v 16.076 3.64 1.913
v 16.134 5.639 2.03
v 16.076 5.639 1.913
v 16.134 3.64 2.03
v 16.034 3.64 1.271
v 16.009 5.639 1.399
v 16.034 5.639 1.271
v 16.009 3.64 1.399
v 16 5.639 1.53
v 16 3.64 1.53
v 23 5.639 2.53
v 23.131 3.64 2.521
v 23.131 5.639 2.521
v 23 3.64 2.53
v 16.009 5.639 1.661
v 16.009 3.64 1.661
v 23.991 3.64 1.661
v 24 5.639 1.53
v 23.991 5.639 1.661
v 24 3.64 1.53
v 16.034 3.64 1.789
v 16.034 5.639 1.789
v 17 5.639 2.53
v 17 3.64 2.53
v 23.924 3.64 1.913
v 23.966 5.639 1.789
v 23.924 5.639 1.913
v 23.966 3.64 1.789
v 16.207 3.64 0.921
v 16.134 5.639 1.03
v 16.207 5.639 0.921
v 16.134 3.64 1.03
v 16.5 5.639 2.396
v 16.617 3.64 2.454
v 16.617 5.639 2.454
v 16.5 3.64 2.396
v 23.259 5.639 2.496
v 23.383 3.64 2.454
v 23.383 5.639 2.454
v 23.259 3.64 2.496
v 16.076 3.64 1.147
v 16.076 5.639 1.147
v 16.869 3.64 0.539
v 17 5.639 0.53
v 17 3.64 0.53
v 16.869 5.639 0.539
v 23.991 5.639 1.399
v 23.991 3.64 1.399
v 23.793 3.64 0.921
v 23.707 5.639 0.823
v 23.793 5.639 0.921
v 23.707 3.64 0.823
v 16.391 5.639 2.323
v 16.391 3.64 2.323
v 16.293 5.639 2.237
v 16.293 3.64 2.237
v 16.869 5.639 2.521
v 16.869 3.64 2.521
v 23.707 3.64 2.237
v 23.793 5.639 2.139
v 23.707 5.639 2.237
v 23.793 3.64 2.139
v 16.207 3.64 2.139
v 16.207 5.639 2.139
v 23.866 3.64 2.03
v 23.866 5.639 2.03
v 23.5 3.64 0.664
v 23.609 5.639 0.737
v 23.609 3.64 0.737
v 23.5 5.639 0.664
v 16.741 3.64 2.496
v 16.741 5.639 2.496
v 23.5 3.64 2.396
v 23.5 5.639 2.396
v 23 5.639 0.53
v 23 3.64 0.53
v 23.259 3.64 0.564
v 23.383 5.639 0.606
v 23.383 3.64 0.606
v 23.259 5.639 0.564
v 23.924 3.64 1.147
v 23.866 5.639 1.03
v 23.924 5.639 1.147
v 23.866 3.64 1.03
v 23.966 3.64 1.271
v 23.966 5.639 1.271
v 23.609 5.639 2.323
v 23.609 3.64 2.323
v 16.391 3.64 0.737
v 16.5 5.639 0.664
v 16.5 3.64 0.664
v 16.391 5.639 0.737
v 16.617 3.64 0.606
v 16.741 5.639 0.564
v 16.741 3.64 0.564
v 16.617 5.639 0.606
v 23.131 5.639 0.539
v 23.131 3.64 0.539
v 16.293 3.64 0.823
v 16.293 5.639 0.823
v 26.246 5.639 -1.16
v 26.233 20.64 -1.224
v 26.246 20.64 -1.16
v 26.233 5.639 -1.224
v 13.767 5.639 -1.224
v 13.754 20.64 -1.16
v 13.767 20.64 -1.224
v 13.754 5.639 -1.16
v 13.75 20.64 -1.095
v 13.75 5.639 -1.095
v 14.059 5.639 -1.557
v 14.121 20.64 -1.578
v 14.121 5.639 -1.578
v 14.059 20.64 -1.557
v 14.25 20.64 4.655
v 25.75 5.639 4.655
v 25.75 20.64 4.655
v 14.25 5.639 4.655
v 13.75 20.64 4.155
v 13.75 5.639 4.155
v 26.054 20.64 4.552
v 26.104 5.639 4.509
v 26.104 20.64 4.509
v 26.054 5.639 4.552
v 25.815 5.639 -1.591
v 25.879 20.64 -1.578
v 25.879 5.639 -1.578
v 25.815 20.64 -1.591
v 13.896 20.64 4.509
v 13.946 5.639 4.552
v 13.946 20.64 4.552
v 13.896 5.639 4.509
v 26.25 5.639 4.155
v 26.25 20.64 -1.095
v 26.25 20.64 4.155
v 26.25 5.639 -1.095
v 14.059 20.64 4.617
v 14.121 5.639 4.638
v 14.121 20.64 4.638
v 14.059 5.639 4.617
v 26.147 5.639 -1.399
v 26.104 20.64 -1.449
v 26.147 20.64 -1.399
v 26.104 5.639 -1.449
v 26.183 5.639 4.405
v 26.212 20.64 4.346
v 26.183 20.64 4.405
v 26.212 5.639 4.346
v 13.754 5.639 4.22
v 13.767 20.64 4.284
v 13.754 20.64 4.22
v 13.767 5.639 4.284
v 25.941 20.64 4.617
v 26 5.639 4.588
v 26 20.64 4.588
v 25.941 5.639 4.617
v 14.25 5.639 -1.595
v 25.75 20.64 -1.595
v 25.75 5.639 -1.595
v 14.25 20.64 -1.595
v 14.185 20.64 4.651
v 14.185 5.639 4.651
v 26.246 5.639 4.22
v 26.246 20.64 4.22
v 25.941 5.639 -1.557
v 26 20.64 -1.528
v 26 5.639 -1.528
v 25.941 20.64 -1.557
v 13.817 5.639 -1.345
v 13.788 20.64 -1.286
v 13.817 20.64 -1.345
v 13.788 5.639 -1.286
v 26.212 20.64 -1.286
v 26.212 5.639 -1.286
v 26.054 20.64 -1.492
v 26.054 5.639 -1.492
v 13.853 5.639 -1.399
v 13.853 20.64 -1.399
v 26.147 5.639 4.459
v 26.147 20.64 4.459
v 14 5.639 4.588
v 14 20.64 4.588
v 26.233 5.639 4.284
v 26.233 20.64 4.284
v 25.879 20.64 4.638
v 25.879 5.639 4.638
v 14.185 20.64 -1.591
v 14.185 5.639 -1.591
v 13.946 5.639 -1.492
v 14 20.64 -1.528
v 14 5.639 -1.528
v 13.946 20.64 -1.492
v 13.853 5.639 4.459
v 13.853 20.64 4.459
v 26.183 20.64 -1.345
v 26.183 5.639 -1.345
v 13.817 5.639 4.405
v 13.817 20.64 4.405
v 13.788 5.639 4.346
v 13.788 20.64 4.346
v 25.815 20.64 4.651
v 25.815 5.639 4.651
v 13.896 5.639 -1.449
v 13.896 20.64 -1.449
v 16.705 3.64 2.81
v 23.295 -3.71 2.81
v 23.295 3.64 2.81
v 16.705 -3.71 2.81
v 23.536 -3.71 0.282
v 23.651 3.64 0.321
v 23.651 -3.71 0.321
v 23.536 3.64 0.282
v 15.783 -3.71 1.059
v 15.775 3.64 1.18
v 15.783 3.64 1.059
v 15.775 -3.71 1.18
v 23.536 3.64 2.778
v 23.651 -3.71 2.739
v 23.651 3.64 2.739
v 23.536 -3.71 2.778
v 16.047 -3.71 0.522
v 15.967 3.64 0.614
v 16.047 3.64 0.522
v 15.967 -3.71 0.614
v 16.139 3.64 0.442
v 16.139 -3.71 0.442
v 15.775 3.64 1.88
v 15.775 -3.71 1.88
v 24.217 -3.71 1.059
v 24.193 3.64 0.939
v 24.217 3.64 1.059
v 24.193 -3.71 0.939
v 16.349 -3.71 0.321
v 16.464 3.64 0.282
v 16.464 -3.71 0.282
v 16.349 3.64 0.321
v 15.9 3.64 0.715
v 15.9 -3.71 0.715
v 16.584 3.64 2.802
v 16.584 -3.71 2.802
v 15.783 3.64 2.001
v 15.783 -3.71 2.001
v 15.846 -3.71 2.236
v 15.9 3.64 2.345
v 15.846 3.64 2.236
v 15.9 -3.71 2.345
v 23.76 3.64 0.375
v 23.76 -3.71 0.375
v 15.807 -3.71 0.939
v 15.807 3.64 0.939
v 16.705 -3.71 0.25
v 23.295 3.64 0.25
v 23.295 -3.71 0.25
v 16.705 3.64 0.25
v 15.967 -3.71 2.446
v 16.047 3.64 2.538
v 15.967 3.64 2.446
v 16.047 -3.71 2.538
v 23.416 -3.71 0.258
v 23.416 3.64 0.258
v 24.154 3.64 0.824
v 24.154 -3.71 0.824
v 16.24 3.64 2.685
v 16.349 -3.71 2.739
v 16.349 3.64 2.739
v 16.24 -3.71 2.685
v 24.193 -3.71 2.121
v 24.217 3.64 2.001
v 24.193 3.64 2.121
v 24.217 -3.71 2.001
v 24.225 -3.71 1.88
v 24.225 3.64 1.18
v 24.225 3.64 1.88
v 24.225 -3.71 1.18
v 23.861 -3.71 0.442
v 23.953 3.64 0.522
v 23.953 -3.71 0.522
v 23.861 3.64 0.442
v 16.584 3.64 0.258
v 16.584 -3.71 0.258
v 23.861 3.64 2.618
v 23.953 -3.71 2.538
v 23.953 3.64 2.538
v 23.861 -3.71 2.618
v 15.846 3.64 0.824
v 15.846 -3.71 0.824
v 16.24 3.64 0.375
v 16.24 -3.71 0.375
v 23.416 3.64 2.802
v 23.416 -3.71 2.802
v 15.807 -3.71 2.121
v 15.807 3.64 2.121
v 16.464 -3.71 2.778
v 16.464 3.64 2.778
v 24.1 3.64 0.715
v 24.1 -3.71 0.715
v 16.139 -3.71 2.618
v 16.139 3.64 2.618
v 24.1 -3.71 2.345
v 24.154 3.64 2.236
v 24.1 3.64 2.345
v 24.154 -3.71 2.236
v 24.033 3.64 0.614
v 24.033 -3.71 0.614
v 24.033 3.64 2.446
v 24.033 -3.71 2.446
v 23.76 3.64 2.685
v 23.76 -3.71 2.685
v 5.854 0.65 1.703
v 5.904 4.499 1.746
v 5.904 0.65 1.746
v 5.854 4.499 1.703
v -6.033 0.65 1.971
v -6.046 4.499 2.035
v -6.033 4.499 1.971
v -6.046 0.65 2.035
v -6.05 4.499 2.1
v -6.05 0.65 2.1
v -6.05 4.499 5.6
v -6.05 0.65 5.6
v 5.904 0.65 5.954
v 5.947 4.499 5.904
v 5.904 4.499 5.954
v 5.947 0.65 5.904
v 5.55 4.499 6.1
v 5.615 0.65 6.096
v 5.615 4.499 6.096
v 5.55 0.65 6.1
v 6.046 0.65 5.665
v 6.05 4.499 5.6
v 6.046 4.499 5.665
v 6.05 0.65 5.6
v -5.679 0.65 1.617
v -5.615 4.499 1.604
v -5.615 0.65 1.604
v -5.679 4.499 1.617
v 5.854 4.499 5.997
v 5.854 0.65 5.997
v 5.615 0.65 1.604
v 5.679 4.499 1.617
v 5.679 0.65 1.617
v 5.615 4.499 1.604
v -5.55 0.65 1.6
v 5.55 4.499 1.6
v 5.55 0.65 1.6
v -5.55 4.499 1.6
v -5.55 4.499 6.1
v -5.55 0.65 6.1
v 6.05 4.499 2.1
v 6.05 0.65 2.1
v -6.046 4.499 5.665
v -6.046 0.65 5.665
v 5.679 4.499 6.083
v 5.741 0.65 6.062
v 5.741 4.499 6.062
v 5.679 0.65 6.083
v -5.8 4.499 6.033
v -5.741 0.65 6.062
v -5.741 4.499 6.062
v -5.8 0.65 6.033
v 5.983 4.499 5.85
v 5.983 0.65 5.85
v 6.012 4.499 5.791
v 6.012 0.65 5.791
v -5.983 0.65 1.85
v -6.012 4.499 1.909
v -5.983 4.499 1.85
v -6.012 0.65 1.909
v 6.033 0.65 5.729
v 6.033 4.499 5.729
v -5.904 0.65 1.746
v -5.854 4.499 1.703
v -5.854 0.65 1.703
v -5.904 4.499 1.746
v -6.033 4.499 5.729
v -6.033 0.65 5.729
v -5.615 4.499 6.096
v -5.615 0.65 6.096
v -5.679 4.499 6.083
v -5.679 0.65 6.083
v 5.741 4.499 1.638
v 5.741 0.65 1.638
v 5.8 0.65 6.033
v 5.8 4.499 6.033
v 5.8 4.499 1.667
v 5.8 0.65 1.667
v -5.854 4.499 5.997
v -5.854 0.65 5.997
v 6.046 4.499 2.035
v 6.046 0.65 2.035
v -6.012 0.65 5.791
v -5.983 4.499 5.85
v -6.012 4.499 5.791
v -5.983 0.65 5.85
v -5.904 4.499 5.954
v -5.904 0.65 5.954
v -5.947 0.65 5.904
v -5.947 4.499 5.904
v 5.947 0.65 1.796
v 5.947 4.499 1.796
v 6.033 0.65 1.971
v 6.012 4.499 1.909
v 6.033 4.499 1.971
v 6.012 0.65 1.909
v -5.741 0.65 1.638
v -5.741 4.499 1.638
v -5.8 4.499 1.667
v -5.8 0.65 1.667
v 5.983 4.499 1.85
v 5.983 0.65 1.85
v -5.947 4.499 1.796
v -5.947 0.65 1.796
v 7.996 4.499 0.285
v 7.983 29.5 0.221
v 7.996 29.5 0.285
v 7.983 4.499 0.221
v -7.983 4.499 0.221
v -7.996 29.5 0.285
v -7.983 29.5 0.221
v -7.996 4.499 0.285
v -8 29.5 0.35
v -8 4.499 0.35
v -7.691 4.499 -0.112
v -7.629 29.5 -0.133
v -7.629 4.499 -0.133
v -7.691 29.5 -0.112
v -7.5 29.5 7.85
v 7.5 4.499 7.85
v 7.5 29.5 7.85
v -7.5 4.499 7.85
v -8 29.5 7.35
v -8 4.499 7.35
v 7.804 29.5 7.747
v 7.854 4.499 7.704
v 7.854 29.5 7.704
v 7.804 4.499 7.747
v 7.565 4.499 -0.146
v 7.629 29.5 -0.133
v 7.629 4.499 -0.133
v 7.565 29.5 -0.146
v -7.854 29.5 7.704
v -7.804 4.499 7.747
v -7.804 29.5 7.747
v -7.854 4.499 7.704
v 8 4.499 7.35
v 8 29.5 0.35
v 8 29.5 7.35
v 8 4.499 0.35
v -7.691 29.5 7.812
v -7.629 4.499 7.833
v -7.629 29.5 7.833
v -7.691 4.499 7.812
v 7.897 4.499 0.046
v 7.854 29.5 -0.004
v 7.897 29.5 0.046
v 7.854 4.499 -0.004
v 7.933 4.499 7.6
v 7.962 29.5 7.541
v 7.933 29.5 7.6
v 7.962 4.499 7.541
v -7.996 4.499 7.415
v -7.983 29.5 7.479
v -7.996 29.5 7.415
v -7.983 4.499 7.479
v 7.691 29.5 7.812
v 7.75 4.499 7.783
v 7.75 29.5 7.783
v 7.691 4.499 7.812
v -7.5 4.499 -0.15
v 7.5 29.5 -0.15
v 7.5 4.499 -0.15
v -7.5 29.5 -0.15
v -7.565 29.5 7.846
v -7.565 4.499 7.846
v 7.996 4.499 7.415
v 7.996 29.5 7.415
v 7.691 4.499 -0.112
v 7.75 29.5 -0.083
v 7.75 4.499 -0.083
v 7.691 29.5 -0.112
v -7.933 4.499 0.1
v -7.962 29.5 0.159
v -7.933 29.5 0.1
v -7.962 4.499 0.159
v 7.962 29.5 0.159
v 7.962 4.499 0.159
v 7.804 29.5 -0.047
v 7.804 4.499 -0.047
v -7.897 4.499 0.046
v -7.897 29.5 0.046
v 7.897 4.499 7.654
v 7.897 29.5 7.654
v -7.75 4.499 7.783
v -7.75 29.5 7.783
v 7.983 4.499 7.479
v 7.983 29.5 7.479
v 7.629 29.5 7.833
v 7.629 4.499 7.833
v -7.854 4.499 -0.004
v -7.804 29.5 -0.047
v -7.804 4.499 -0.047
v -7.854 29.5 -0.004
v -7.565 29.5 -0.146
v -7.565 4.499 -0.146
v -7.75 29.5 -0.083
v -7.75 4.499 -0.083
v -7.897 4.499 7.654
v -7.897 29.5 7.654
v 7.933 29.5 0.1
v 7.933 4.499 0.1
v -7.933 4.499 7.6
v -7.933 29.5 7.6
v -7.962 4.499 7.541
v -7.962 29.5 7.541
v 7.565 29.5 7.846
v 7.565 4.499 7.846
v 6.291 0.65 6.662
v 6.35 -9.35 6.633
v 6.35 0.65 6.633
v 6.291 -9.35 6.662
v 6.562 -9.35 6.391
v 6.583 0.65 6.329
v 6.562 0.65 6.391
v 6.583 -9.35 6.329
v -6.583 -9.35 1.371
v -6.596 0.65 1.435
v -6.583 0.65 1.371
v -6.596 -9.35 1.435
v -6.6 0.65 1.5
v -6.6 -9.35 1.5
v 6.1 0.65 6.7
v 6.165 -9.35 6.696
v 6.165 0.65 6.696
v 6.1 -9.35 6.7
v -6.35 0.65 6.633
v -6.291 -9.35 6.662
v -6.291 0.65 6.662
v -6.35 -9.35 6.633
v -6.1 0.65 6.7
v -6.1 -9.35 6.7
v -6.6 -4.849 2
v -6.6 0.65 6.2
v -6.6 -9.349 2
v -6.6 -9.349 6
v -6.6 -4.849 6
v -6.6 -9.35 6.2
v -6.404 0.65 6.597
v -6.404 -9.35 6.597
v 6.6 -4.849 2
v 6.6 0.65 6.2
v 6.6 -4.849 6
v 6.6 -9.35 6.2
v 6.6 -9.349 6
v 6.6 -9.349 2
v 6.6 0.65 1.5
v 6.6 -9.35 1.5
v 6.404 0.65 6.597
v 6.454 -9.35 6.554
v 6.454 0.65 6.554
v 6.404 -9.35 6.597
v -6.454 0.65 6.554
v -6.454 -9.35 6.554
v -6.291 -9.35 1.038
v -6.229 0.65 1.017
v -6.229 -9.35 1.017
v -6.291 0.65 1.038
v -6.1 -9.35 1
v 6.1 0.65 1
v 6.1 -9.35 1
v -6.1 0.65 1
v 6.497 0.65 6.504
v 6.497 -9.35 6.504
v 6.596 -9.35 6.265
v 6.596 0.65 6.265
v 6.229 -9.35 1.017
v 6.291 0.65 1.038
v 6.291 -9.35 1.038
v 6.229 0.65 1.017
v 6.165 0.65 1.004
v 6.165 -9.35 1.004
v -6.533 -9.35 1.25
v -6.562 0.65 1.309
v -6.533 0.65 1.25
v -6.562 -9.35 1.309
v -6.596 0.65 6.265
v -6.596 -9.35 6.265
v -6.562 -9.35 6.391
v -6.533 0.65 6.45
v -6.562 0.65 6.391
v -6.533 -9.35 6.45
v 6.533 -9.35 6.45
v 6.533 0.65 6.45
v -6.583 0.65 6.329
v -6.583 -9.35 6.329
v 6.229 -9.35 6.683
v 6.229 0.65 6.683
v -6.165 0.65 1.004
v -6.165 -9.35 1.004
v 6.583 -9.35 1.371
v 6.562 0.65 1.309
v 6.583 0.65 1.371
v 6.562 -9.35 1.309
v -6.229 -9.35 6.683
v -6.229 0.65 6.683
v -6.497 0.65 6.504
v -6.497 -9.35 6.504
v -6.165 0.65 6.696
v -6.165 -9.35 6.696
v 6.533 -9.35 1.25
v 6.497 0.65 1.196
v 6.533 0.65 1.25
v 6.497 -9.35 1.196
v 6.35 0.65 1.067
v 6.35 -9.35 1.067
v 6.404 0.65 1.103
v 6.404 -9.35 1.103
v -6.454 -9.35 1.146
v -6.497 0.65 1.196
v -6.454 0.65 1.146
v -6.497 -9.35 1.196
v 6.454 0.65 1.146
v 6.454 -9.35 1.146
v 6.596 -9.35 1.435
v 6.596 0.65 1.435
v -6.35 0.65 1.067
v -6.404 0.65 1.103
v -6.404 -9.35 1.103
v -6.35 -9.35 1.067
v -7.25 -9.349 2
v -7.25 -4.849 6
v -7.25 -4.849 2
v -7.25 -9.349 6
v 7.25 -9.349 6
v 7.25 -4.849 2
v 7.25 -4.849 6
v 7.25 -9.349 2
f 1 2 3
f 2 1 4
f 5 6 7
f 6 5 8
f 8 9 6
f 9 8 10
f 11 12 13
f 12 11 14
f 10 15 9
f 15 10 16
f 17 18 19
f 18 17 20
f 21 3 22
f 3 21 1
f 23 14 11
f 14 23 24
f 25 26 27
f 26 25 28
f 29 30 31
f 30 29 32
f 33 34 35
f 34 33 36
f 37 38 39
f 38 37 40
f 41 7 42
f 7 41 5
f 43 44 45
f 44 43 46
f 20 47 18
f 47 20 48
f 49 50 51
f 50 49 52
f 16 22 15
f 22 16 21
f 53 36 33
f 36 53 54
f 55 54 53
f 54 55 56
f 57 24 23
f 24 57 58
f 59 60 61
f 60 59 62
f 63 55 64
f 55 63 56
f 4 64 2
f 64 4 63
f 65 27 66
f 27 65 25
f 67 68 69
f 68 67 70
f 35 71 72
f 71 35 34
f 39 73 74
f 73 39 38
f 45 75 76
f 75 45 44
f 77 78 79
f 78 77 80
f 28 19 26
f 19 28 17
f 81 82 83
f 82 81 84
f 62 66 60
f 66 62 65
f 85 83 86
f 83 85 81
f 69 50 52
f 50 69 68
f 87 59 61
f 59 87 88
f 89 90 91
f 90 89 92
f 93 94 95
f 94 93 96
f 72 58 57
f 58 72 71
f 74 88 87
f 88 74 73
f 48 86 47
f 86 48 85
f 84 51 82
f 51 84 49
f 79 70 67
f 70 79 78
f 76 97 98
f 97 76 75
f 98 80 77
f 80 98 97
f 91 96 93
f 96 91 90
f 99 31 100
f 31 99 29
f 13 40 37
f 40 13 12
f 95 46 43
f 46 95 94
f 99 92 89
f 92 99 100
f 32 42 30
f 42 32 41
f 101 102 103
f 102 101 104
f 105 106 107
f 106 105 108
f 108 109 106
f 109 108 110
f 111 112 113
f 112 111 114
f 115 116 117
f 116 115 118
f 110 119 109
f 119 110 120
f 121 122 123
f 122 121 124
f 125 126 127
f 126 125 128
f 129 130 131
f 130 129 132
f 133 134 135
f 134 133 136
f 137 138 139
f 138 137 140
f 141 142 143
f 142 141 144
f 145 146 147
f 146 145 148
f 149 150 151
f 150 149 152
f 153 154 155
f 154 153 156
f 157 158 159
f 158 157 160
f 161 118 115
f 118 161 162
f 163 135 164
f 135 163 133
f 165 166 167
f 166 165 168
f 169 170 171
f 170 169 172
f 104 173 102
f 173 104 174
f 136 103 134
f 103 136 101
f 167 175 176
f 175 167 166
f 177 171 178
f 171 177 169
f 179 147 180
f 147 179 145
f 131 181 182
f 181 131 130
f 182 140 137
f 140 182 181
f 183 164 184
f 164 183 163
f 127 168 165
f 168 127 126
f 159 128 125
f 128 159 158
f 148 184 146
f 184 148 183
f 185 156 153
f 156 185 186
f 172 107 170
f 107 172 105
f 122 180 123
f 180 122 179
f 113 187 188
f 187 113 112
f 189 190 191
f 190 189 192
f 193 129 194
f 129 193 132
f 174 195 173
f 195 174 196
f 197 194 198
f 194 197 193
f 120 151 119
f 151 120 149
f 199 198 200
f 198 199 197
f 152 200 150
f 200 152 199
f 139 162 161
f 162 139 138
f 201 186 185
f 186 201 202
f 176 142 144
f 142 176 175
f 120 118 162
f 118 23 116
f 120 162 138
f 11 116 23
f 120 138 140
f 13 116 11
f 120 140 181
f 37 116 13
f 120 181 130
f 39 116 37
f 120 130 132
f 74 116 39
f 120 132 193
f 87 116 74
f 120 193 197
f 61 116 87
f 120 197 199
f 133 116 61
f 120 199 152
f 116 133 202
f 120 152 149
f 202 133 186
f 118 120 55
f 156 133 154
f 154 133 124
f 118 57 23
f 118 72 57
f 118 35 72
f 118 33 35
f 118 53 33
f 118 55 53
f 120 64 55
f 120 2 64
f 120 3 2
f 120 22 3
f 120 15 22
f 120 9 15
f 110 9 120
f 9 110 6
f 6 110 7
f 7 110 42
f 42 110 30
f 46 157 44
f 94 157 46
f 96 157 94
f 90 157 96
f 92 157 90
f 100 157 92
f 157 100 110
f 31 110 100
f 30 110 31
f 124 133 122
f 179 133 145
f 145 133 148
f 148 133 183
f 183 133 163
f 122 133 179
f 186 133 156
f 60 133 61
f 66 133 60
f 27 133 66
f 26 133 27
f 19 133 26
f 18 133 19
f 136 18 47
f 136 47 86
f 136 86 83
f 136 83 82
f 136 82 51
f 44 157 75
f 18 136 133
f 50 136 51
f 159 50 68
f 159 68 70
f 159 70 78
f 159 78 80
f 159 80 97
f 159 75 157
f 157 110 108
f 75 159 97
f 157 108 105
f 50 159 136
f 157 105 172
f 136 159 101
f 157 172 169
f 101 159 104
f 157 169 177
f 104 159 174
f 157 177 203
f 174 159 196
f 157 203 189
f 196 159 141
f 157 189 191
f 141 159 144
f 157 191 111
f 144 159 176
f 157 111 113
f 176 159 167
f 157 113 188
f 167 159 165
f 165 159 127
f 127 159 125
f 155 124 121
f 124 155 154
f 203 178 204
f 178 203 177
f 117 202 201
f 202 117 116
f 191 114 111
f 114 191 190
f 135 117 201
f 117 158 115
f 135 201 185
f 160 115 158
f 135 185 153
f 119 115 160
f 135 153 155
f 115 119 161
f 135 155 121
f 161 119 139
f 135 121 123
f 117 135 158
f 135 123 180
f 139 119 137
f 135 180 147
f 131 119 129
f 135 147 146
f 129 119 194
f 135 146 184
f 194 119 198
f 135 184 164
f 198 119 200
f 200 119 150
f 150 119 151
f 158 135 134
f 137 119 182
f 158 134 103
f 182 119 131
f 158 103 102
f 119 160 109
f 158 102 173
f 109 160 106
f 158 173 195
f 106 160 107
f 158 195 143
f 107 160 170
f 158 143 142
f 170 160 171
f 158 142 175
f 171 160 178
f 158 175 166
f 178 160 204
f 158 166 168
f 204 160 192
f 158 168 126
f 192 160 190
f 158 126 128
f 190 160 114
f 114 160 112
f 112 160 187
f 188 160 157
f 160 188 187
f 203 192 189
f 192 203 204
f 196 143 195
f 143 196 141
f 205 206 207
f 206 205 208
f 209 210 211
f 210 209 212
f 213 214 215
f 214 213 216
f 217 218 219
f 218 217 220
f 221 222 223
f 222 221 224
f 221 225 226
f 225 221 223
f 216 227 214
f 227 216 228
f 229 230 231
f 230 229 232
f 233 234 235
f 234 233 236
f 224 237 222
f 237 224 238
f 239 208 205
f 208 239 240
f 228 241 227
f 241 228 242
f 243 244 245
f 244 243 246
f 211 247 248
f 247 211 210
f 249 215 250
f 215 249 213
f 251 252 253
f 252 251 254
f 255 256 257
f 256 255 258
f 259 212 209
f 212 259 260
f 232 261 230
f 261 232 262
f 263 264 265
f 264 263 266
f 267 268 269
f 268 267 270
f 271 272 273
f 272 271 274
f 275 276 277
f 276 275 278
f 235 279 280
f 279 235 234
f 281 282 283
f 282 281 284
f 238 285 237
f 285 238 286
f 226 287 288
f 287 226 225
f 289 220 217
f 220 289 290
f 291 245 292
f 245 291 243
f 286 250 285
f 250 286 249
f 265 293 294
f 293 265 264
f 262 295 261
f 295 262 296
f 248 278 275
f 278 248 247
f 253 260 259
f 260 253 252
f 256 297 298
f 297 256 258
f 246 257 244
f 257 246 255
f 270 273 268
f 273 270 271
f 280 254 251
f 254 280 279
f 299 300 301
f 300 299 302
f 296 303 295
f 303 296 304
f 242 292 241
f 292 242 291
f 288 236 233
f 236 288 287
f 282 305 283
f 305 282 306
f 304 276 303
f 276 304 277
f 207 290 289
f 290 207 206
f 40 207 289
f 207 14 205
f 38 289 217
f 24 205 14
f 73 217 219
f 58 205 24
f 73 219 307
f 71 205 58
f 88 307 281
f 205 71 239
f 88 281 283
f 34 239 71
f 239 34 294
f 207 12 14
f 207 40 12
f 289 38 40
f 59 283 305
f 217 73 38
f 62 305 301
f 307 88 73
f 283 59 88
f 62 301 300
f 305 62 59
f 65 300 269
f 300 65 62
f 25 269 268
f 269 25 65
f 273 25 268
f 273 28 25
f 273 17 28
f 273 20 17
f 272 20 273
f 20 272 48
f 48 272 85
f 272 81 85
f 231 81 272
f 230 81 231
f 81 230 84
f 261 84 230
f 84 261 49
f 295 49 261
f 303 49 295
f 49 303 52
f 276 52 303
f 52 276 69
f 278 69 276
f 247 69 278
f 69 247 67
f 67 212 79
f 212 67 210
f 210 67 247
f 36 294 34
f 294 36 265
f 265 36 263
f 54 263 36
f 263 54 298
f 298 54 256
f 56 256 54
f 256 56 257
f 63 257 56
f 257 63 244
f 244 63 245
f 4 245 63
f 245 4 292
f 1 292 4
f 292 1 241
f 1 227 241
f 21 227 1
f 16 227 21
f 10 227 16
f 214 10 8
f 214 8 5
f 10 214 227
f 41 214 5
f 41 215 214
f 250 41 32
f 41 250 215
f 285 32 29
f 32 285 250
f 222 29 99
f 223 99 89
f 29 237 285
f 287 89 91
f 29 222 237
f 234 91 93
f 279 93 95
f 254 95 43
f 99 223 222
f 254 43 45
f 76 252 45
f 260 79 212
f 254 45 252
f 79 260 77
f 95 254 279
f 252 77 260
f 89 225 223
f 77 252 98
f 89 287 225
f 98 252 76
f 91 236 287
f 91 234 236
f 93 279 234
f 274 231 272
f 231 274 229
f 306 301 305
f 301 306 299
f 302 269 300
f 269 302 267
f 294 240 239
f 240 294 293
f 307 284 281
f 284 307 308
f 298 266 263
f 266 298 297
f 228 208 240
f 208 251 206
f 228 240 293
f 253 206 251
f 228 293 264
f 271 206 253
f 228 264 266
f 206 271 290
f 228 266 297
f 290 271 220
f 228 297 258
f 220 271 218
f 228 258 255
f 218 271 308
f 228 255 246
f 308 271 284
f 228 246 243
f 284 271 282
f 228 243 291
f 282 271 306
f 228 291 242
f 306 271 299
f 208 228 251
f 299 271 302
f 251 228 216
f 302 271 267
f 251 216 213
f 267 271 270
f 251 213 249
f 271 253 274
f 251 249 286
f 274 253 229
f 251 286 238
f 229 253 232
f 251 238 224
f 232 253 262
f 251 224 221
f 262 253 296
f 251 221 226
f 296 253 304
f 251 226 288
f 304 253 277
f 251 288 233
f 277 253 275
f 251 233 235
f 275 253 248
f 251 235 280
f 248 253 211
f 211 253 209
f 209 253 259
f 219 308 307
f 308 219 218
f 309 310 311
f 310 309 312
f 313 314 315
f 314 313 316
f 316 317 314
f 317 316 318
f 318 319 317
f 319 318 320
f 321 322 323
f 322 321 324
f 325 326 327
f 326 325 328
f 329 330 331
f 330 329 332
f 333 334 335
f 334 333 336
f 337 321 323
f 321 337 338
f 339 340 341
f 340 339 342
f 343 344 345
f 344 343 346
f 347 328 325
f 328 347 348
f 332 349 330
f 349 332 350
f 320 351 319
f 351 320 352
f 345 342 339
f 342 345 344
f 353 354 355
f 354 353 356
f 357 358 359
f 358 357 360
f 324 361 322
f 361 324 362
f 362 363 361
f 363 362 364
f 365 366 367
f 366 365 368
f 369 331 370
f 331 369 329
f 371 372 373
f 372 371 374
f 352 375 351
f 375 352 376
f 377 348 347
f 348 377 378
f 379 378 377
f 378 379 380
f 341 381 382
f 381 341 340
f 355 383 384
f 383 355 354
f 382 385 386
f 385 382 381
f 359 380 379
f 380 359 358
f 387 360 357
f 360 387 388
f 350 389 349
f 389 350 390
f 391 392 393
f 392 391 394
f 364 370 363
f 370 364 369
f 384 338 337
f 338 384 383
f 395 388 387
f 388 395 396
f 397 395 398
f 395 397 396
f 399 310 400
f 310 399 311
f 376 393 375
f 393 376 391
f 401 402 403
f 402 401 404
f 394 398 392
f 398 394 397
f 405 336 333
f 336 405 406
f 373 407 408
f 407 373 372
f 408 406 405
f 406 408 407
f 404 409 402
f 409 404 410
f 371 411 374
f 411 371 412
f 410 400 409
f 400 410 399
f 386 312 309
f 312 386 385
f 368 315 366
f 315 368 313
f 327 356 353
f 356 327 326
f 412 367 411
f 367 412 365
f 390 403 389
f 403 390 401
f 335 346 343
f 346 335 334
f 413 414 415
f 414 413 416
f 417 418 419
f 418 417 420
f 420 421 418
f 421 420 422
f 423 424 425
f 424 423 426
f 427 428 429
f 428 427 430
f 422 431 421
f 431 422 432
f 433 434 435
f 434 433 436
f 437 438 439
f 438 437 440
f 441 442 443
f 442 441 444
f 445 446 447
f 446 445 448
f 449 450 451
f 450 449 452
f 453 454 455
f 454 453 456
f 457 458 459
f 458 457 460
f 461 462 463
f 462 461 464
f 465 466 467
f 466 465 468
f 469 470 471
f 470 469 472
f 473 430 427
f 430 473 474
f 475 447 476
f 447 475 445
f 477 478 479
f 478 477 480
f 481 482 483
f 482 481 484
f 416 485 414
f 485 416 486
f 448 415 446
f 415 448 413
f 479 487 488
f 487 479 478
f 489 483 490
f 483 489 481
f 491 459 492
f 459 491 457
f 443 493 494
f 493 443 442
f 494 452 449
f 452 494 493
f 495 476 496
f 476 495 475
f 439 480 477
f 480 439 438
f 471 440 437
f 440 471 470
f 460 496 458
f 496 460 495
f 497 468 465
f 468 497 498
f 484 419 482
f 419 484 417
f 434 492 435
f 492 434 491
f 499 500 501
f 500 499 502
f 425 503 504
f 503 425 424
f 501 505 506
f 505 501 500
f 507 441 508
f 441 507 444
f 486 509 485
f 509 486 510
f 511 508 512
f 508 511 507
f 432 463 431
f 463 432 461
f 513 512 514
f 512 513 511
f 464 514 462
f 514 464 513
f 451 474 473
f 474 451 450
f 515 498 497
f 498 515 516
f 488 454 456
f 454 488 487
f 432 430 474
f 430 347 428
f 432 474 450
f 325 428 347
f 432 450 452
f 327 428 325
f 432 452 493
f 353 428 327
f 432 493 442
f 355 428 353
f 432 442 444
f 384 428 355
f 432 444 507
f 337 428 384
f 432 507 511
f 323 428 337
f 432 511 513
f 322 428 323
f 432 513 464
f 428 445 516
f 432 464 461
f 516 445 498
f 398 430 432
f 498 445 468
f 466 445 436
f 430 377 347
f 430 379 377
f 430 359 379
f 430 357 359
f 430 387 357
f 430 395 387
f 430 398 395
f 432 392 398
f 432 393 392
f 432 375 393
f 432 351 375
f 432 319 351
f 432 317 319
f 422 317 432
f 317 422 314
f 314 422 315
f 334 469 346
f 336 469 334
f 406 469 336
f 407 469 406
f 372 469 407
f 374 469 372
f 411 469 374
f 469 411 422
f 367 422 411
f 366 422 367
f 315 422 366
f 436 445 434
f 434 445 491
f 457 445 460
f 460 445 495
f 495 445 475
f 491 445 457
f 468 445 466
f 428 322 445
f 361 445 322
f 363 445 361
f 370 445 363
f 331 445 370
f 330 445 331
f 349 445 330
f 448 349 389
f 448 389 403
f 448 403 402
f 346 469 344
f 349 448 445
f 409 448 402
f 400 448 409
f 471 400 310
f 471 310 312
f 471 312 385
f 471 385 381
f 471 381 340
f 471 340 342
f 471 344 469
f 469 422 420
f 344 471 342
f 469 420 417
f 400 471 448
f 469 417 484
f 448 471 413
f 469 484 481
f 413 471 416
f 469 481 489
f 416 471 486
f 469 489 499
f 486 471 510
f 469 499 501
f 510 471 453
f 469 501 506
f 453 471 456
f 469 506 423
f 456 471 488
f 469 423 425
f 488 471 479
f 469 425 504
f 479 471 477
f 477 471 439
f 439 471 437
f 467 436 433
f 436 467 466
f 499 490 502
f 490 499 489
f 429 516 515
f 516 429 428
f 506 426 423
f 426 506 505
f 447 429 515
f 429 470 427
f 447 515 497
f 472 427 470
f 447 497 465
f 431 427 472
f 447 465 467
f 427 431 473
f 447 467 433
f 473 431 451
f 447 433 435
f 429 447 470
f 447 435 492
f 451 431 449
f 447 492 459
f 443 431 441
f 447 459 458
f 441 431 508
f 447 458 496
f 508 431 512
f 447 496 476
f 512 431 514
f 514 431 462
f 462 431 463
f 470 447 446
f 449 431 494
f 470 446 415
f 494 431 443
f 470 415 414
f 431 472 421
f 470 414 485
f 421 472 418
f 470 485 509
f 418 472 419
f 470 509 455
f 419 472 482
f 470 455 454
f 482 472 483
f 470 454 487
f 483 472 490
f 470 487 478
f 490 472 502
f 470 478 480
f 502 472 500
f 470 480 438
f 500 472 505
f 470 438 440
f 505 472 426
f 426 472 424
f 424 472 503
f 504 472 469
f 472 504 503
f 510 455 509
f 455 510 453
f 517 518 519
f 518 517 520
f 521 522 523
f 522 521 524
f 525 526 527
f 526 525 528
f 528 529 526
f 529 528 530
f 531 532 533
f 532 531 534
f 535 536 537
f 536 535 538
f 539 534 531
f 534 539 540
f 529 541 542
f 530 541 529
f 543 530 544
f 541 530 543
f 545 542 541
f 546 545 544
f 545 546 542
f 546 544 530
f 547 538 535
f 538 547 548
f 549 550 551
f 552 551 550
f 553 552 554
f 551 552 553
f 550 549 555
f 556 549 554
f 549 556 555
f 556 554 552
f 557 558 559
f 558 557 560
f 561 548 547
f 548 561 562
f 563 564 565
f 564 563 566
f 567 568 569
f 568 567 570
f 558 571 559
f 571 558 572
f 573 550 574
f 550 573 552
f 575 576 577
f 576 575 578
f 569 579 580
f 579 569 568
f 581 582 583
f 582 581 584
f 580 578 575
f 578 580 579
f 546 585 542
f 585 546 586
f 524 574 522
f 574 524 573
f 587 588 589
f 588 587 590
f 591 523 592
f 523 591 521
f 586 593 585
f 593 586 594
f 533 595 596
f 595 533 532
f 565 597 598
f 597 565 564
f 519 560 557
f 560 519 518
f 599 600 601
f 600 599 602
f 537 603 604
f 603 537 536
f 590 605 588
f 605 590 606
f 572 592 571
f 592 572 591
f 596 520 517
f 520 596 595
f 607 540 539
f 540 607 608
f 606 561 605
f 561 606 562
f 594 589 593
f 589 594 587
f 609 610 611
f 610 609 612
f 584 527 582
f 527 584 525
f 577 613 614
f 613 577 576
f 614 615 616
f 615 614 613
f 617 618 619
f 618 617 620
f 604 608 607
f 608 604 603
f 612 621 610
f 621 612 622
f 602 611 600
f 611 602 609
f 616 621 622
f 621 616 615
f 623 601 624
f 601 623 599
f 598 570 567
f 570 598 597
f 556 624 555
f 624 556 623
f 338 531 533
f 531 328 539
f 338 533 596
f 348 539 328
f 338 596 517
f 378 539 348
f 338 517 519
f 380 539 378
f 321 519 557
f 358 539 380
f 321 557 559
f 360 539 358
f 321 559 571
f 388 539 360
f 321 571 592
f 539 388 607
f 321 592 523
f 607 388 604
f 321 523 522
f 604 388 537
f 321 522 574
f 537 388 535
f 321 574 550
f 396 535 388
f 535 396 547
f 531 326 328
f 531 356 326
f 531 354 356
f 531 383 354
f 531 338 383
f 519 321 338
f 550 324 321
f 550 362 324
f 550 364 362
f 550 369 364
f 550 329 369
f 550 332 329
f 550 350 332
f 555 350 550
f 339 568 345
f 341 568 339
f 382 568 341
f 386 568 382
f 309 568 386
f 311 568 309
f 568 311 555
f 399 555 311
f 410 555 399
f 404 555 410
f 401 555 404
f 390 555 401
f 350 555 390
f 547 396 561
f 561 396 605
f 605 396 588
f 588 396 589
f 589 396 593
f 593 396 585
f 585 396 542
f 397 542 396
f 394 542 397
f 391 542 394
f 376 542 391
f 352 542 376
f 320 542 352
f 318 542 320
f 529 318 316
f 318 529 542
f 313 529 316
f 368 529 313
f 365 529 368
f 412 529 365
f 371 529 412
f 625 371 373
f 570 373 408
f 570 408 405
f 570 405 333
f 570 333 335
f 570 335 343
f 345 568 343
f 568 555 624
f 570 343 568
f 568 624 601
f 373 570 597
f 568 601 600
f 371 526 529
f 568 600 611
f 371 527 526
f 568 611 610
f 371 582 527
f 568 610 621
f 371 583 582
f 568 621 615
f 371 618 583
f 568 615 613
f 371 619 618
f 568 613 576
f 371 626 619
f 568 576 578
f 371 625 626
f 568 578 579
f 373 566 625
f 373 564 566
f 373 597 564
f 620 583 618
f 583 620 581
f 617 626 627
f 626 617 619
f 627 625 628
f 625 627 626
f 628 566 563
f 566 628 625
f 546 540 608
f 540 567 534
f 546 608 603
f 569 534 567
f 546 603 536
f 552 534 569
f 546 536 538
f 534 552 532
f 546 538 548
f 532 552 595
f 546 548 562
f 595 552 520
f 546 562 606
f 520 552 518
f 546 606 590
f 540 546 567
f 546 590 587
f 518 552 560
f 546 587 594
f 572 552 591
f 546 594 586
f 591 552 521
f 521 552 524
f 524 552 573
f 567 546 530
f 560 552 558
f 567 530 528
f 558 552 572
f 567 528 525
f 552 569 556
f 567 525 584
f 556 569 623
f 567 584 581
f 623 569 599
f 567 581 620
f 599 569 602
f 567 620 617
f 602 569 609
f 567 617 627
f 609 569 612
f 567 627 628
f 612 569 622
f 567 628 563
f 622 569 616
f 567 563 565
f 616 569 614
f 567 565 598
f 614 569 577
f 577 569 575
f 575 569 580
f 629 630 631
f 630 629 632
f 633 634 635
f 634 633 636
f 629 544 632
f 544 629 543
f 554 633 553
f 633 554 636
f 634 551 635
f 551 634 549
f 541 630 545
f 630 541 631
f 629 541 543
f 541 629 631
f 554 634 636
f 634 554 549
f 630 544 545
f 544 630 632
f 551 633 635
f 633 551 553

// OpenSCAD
e=.001;
$fn=48;

usb_c_depth = 7.35;
usb_c_width = 8.45;
usb_c_height = 2.56;
usb_c_z = .25;
usb_c_edge_radius = .93;
usb_c_front_from_origin = 6.77-3.13;
usb_c_plug_end = 1.77-3.13;

usb_c_plug_depth = 7;
usb_c_plug_width = 8;
usb_c_plug_height = 2;

usb_c_plug_shroud_width = 12.5;
usb_c_plug_shroud_height = 6.25;
usb_c_plug_shroud_depth = 15;
usb_c_plug_shroud_radius = .5;

usb_a_depth = 10;
usb_a_width = 13.2;
usb_a_height = 5.7;
usb_a_edge_radius = .5;
usb_a_z = 1.;
usb_a_overlap = .65;
usb_a_plastic_depth = 4.5;
usb_a_plastic_width = 14.5;
usb_a_plastic_height = 4;
usb_a_plastic_z = usb_a_z + 1.;



usb_a_plug_depth = 12.5;
usb_a_plug_width = 12.1;
usb_a_plug_height = 4.5;
usb_a_plug_radius = .5;
usb_a_plug_end = -8;

usb_a_plug_shroud_width = 16;
usb_a_plug_shroud_height = 8;
usb_a_plug_shroud_depth = 25;
usb_a_plug_shroud_radius = .5;

module rounded_rect(w, h, r, center=false)
{
	off_x = center ? w/2 : 0 ;
	off_y = center ? h/2 : 0 ;
	hull()
	{
		for (x=[r,w-r])
		for (y=[r,h-r])
		translate([off_x+x,off_y+y])
		circle(r=r);
	}
}

module usb_c_keepout()
{
	color([.9,.9,.9])
	{
		translate([-10, -9.2/2.+1.25, 0])
		cube([20, 9.2-2.5, 3.2]);

		for (y=[-9.2/2.+1.25, 9.2/2.-1.25])
		translate([-10, y, 1.6])
		rotate([0,90,0])
		scale([1.6,1.25,1])
		cylinder(h=20, r=1);
	}
}

module usb_c_plug(margin=0)
{
	color([.97,.97,.97])
	translate([-usb_c_plug_width/2-margin,
	            usb_c_plug_depth+margin,
	           -usb_c_plug_height/2-margin ])
	rotate([90,0,0])
	linear_extrude(usb_c_plug_depth+2*margin+e) rounded_rect(usb_c_plug_width+2*margin, usb_c_plug_height+2*margin, usb_c_plug_height/2+margin);

	color([.3,.3,.3])
	translate([-usb_c_plug_shroud_width/2-margin,
	            usb_c_plug_depth+usb_c_plug_shroud_depth+margin,
	           -usb_c_plug_shroud_height/2-margin ])
	rotate([90,0,0])
	linear_extrude(usb_c_plug_shroud_depth+2*margin+e) rounded_rect(usb_c_plug_shroud_width+2*margin, usb_c_plug_shroud_height+2*margin, usb_c_plug_shroud_radius+margin);
}

module usb_c_type_c31_m12(margin=0)
{
	translate([0,0,usb_c_z])
	{
		color([.9,.9,.9])
		translate([-usb_c_width/2-margin,usb_c_front_from_origin+margin,-margin ])
		rotate([90,0,0])
		linear_extrude(usb_c_depth+2*margin) rounded_rect(usb_c_width+2*margin, usb_c_height+2*margin, usb_c_edge_radius+margin);

		translate([0,usb_c_plug_end,usb_c_height/2])
		children();
	}
}


module usb_a_shou_han(margin=0)
{
	color([.9,.9,.9])
	translate([-usb_a_width/2-margin,usb_a_overlap+margin,usb_a_z -margin ])
	rotate([90,0,0])
	linear_extrude(usb_a_depth+2*margin) rounded_rect(usb_a_width+2*margin, usb_a_height+2*margin, usb_a_edge_radius+margin);

	color([.1,.1,.1])
	translate([-usb_a_plastic_width/2-margin,usb_a_overlap+margin-usb_a_depth+usb_a_plastic_depth+e,usb_a_plastic_z -margin ])
	rotate([90,0,0])
	cube([usb_a_plastic_width+2*margin, usb_a_plastic_height+2*margin, usb_a_plastic_depth+2*margin]);

	translate([0,usb_a_plug_end/*+8.65*/,usb_a_height/2+usb_a_z])
	children();
}


module usb_a_plug(margin=0)
{
	color([.97,.97,.97])
	translate([-usb_a_plug_width/2-margin,
	            usb_a_plug_depth+margin,
	           -usb_a_plug_height/2-margin ])
	rotate([90,0,0])
	linear_extrude(usb_a_plug_depth+2*margin+e) rounded_rect(usb_a_plug_width+2*margin, usb_a_plug_height+2*margin, usb_a_plug_radius+margin);

	color([.3,.3,.3])
	translate([-usb_a_plug_shroud_width/2-margin,
            usb_a_plug_depth+usb_a_plug_shroud_depth+margin,
           -usb_a_plug_shroud_height/2-margin ])
	rotate([90,0,0])
	linear_extrude(usb_a_plug_shroud_depth+2*margin+e) rounded_rect(usb_a_plug_shroud_width+2*margin, usb_a_plug_shroud_height+2*margin,usb_a_plug_shroud_radius+margin);
}

translate([20,0,0])usb_c_type_c31_m12(margin=0) usb_c_plug(margin=0);
usb_a_shou_han(margin=0) usb_a_plug(margin=0);
